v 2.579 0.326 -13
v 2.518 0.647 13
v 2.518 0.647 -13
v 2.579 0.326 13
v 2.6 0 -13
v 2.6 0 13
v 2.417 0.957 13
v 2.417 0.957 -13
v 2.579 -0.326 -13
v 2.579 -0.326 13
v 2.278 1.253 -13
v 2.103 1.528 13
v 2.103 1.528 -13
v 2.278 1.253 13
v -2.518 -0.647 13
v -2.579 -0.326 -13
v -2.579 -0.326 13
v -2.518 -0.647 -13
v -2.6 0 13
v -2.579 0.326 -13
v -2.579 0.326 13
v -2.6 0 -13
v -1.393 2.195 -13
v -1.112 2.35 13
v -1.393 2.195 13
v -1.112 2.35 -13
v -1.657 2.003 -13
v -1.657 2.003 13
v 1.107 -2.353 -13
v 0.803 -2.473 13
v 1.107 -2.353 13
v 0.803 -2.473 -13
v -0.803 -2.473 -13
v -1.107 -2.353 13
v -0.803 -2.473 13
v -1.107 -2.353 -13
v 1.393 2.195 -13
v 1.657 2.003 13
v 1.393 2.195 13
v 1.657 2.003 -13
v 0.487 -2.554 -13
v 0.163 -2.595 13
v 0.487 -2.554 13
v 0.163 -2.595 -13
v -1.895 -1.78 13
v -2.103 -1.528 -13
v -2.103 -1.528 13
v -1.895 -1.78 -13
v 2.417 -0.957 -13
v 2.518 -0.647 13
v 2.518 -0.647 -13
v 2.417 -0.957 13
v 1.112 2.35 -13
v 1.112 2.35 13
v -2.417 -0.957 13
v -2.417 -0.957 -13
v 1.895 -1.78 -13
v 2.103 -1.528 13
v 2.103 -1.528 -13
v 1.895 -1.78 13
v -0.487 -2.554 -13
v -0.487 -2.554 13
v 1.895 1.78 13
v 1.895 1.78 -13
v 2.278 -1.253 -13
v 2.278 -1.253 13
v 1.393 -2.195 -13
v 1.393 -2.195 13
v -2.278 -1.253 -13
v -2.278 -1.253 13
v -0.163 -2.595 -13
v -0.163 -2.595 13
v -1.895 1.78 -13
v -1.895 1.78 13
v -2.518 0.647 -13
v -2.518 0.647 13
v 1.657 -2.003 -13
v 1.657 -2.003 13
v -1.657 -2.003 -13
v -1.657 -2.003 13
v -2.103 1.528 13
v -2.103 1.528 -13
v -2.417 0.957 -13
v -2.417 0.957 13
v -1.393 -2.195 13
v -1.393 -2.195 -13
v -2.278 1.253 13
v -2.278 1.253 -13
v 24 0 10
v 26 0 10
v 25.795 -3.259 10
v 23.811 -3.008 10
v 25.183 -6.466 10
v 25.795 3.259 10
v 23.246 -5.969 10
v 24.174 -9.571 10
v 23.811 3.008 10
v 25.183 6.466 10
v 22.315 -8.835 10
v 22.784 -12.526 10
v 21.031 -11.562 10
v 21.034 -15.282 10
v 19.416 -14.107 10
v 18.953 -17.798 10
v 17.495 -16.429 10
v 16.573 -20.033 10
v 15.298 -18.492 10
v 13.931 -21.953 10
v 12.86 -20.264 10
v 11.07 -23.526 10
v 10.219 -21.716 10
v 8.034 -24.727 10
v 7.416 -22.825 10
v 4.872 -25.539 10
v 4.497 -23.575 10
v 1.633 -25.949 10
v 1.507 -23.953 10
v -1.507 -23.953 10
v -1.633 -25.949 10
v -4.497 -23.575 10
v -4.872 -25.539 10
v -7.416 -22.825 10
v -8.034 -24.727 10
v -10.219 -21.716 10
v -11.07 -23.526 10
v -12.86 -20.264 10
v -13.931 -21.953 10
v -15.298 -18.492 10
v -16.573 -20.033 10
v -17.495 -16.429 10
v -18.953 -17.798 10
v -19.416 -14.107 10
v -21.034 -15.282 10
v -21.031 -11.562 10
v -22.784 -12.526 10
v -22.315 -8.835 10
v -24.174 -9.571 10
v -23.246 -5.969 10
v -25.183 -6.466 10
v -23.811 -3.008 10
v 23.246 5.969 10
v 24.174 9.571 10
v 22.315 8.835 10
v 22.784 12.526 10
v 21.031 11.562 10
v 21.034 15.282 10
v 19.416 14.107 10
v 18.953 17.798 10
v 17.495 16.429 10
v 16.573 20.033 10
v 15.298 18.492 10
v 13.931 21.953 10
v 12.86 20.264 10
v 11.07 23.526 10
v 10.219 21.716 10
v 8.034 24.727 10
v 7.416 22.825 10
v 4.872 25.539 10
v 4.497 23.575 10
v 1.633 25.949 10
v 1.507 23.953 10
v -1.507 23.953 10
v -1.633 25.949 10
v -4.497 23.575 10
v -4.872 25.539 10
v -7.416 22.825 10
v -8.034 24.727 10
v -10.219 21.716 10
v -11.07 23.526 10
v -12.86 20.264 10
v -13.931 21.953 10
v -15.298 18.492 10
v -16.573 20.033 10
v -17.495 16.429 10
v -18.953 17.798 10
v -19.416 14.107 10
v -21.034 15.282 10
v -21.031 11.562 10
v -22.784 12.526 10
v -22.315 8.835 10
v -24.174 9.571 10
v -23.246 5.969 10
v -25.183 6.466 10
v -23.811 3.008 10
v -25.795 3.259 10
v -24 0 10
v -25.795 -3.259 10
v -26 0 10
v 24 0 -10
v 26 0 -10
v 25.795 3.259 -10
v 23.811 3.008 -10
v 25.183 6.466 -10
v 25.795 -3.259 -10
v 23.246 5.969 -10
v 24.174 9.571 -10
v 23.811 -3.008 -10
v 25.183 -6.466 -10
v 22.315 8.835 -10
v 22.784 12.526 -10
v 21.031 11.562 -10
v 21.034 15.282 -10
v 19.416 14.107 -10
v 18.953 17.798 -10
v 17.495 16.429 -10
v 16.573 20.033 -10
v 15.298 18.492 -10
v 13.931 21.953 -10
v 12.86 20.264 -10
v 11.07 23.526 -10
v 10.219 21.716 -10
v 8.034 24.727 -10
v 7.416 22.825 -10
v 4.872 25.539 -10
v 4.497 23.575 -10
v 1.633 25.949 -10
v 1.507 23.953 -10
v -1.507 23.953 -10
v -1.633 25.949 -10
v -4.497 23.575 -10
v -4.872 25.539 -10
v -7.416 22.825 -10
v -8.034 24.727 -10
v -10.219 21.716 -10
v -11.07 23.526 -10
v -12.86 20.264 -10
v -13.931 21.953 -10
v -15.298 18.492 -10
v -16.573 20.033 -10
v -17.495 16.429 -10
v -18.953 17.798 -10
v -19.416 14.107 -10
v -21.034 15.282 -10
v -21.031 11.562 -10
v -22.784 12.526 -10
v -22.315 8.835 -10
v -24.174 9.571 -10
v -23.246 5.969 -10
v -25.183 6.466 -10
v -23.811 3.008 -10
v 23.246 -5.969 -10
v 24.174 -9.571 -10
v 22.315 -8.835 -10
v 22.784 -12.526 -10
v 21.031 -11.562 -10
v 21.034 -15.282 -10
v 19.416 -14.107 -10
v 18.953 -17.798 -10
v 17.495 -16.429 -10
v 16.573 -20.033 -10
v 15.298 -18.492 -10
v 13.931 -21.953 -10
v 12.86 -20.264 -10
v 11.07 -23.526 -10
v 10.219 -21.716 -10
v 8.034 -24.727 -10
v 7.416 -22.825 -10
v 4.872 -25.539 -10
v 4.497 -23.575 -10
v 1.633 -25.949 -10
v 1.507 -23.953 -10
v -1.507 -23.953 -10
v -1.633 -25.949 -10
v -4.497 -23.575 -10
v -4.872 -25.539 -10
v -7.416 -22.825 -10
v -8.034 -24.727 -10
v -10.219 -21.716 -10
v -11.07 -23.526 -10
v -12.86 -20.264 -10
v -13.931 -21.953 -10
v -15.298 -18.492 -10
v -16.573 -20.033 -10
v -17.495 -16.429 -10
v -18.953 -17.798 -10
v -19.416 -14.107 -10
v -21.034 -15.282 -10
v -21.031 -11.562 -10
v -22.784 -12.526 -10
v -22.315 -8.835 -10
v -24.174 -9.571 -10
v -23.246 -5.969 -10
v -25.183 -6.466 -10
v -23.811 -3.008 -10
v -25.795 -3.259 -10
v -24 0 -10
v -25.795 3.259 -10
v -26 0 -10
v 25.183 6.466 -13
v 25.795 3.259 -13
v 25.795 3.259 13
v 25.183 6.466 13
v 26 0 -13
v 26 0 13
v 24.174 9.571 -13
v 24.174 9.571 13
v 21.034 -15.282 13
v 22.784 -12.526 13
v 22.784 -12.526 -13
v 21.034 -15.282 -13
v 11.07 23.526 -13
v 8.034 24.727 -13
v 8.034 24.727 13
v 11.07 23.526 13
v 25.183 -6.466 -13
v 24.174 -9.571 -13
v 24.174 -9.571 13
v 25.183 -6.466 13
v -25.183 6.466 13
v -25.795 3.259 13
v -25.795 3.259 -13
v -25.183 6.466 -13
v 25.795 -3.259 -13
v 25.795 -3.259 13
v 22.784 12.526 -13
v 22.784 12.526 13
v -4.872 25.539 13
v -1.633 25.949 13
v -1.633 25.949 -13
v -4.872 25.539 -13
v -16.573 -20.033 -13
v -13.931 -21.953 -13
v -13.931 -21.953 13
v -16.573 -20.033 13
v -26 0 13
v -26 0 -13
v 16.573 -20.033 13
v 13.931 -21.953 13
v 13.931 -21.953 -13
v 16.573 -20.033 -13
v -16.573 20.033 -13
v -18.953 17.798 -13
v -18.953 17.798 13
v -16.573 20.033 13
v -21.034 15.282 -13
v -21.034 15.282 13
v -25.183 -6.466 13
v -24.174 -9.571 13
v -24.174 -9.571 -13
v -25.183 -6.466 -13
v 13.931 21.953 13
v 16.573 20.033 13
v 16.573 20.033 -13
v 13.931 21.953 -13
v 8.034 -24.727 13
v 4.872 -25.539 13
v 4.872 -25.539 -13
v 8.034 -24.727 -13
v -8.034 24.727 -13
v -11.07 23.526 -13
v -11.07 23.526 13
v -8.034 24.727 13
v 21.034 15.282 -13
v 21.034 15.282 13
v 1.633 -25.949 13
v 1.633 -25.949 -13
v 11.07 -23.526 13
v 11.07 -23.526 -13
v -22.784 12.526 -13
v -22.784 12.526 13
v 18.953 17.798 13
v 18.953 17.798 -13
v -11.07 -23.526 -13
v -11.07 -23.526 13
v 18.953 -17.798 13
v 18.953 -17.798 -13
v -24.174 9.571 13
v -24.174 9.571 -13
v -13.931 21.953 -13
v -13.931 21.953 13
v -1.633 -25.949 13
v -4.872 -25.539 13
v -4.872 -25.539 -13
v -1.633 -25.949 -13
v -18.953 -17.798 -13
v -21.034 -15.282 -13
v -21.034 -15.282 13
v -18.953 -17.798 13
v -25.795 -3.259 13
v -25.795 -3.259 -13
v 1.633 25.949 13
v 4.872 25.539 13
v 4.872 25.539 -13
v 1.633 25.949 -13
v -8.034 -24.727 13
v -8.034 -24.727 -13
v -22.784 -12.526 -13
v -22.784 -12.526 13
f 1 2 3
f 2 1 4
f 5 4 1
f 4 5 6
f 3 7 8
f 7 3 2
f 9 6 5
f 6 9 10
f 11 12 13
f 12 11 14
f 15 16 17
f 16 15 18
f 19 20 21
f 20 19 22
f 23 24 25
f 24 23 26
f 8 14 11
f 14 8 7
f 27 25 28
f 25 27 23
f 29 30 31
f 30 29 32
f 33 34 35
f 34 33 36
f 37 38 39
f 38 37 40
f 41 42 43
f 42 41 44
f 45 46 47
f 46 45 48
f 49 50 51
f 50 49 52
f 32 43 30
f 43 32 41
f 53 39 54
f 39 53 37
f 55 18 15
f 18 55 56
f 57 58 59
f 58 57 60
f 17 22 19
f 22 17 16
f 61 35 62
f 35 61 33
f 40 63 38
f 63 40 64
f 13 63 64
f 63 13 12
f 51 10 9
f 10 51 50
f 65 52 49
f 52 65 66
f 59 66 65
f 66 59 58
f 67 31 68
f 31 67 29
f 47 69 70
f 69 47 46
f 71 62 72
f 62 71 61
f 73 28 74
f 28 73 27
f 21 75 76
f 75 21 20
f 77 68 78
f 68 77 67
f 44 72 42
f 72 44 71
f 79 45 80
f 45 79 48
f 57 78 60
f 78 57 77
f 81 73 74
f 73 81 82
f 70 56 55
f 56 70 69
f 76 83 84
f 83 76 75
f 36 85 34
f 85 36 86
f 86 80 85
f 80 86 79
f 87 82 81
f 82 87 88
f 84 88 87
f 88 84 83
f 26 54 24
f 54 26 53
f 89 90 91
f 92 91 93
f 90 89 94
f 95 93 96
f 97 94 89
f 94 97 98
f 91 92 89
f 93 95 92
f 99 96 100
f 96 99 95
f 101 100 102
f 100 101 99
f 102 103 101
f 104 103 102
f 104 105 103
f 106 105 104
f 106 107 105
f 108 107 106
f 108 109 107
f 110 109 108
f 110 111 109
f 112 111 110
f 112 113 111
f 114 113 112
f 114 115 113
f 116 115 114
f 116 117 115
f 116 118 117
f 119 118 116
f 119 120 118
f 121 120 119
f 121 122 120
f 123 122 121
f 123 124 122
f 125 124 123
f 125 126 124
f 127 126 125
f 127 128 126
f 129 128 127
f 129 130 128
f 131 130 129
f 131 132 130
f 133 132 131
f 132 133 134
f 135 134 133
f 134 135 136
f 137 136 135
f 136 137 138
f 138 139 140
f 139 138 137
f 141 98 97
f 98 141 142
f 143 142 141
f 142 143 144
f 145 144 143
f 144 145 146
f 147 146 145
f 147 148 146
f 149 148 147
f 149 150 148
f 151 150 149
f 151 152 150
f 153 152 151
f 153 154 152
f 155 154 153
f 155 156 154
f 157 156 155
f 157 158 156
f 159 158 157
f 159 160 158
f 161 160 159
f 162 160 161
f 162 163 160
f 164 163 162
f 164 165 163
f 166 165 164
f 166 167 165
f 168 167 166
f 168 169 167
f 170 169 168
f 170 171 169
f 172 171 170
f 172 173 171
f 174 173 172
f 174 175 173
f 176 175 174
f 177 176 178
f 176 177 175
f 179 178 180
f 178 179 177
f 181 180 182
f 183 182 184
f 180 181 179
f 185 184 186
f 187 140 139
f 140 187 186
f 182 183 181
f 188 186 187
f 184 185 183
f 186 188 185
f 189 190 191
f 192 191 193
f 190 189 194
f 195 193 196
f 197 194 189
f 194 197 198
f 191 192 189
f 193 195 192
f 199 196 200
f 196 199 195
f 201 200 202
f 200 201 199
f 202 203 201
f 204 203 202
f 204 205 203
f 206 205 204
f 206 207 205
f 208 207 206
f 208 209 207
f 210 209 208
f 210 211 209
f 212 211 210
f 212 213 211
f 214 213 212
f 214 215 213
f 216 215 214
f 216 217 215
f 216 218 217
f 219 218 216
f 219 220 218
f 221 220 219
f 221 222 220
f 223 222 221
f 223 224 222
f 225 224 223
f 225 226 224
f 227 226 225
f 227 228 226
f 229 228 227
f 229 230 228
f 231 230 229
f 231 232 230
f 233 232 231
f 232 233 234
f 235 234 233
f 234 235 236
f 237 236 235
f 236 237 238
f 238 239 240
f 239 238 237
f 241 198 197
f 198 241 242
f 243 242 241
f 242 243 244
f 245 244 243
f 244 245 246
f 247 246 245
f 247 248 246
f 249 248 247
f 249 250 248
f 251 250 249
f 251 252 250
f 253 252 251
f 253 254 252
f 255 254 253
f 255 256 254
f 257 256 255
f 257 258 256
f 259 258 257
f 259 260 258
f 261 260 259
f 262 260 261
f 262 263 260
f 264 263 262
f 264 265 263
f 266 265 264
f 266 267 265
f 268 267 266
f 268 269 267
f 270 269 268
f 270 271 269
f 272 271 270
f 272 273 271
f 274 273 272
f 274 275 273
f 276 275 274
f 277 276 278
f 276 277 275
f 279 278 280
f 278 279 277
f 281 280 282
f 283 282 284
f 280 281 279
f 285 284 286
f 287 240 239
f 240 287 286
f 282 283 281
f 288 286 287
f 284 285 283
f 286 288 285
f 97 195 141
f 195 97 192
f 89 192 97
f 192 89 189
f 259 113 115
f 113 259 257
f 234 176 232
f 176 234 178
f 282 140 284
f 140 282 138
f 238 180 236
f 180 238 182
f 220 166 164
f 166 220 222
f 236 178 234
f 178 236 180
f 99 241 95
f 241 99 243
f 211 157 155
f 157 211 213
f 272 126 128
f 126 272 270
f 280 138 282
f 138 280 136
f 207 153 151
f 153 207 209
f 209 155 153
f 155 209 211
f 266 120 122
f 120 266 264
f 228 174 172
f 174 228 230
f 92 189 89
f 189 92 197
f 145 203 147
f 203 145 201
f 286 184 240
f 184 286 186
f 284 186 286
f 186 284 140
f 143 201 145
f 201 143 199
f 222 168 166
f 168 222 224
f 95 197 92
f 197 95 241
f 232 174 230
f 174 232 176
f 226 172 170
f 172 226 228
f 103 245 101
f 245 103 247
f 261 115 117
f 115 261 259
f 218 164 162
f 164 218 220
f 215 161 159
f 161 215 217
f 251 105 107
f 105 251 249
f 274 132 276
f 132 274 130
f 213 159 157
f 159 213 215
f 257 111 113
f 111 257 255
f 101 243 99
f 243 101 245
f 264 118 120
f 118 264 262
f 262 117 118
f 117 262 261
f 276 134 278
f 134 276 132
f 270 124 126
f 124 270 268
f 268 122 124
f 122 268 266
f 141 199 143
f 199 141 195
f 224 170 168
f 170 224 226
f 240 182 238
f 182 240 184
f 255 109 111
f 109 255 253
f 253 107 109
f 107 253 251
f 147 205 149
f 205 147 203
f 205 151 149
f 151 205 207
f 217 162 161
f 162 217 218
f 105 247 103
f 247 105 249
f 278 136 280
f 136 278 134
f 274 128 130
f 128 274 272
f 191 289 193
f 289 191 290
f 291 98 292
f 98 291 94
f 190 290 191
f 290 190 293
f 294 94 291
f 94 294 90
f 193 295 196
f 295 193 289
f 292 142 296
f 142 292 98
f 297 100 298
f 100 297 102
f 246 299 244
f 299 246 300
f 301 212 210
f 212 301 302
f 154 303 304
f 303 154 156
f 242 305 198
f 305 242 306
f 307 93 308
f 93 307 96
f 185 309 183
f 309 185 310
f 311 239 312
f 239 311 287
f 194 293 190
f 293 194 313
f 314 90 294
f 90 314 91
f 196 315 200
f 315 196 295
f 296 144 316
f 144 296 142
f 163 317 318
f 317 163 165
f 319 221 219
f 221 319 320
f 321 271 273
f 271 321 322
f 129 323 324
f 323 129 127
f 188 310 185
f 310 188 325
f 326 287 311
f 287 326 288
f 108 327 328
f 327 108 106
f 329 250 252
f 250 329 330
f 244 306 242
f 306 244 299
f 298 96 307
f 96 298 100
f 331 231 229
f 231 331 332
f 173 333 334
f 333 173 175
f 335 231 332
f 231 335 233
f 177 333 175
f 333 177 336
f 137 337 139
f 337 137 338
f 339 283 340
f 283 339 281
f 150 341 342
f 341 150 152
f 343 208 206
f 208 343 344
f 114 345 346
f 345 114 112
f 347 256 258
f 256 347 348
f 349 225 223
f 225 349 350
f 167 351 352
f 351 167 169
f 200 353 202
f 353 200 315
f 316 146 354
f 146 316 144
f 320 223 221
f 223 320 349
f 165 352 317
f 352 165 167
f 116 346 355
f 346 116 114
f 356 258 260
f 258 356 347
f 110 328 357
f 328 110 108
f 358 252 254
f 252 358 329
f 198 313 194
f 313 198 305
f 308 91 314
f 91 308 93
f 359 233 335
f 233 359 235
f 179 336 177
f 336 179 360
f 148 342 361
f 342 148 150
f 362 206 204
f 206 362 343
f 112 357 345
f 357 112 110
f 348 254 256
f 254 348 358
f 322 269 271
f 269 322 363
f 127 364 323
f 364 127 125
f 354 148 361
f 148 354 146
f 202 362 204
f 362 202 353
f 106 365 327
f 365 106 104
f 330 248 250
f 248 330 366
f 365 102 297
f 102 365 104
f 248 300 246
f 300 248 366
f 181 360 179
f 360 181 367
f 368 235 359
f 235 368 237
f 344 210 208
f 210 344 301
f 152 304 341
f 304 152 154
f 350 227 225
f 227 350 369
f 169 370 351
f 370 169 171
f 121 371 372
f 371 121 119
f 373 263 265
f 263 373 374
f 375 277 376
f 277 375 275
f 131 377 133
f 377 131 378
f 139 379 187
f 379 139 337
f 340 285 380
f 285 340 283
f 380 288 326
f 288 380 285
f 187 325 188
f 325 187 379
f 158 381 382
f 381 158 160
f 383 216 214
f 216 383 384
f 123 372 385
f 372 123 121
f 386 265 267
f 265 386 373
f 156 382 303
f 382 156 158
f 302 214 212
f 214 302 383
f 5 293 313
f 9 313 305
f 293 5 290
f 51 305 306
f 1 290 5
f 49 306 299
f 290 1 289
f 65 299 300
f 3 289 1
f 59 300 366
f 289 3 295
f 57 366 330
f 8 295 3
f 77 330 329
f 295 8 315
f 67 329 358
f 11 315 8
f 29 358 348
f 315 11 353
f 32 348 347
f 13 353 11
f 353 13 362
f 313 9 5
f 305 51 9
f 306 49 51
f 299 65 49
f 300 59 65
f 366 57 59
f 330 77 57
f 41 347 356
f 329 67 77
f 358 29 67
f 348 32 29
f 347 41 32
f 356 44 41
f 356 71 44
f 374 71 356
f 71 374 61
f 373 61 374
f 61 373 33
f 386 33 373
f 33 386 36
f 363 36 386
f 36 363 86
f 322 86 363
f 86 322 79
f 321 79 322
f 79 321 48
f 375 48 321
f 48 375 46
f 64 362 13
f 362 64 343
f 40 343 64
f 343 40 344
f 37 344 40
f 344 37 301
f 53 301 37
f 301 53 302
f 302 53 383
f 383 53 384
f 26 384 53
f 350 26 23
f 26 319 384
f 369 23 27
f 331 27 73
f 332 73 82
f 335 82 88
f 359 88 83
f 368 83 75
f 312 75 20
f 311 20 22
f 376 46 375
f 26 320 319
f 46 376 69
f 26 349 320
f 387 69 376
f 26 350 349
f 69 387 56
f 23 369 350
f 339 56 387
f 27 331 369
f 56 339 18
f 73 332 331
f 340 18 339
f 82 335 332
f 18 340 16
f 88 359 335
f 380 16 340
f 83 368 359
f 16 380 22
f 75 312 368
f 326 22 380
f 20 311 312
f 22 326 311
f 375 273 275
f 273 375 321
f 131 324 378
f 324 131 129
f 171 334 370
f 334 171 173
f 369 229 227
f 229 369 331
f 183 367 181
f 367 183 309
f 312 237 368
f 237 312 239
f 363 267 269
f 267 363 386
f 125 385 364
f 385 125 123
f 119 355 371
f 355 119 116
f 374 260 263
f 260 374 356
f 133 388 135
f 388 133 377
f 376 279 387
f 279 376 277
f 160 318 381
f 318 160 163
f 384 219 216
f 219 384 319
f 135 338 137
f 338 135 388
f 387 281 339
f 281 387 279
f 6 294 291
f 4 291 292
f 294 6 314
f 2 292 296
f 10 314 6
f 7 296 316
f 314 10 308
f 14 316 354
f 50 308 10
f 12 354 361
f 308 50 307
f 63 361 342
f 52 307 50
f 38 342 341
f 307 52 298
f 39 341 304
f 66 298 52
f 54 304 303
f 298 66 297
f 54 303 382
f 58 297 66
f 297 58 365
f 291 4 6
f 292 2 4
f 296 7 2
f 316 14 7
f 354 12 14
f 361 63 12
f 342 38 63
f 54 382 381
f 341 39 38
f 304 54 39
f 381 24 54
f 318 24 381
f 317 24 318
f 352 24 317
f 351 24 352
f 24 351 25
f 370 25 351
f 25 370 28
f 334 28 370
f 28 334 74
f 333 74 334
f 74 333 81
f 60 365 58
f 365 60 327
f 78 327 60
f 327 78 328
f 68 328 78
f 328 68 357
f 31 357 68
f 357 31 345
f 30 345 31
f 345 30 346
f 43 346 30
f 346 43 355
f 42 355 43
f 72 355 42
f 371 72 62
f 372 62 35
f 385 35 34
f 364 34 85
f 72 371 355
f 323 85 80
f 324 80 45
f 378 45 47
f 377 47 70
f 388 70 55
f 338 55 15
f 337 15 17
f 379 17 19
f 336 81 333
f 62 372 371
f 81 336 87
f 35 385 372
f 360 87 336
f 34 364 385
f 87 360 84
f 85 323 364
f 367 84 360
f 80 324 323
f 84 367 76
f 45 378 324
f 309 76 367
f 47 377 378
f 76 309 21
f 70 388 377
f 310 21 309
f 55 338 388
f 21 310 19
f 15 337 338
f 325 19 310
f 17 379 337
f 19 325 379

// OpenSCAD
difference(){
    cylinder(26, r=26,center=true,$fn=50);
    difference(){
        cylinder(30, r=2.6,center=true,$fn=50);
        translate([0,2.5,0])cube([10,0.3,100],center=true);
    }
    difference(){
        cylinder(20, r=30,center=true,$fn=50);
        cylinder(20, r=24,center=true,$fn=50);
    }
}
